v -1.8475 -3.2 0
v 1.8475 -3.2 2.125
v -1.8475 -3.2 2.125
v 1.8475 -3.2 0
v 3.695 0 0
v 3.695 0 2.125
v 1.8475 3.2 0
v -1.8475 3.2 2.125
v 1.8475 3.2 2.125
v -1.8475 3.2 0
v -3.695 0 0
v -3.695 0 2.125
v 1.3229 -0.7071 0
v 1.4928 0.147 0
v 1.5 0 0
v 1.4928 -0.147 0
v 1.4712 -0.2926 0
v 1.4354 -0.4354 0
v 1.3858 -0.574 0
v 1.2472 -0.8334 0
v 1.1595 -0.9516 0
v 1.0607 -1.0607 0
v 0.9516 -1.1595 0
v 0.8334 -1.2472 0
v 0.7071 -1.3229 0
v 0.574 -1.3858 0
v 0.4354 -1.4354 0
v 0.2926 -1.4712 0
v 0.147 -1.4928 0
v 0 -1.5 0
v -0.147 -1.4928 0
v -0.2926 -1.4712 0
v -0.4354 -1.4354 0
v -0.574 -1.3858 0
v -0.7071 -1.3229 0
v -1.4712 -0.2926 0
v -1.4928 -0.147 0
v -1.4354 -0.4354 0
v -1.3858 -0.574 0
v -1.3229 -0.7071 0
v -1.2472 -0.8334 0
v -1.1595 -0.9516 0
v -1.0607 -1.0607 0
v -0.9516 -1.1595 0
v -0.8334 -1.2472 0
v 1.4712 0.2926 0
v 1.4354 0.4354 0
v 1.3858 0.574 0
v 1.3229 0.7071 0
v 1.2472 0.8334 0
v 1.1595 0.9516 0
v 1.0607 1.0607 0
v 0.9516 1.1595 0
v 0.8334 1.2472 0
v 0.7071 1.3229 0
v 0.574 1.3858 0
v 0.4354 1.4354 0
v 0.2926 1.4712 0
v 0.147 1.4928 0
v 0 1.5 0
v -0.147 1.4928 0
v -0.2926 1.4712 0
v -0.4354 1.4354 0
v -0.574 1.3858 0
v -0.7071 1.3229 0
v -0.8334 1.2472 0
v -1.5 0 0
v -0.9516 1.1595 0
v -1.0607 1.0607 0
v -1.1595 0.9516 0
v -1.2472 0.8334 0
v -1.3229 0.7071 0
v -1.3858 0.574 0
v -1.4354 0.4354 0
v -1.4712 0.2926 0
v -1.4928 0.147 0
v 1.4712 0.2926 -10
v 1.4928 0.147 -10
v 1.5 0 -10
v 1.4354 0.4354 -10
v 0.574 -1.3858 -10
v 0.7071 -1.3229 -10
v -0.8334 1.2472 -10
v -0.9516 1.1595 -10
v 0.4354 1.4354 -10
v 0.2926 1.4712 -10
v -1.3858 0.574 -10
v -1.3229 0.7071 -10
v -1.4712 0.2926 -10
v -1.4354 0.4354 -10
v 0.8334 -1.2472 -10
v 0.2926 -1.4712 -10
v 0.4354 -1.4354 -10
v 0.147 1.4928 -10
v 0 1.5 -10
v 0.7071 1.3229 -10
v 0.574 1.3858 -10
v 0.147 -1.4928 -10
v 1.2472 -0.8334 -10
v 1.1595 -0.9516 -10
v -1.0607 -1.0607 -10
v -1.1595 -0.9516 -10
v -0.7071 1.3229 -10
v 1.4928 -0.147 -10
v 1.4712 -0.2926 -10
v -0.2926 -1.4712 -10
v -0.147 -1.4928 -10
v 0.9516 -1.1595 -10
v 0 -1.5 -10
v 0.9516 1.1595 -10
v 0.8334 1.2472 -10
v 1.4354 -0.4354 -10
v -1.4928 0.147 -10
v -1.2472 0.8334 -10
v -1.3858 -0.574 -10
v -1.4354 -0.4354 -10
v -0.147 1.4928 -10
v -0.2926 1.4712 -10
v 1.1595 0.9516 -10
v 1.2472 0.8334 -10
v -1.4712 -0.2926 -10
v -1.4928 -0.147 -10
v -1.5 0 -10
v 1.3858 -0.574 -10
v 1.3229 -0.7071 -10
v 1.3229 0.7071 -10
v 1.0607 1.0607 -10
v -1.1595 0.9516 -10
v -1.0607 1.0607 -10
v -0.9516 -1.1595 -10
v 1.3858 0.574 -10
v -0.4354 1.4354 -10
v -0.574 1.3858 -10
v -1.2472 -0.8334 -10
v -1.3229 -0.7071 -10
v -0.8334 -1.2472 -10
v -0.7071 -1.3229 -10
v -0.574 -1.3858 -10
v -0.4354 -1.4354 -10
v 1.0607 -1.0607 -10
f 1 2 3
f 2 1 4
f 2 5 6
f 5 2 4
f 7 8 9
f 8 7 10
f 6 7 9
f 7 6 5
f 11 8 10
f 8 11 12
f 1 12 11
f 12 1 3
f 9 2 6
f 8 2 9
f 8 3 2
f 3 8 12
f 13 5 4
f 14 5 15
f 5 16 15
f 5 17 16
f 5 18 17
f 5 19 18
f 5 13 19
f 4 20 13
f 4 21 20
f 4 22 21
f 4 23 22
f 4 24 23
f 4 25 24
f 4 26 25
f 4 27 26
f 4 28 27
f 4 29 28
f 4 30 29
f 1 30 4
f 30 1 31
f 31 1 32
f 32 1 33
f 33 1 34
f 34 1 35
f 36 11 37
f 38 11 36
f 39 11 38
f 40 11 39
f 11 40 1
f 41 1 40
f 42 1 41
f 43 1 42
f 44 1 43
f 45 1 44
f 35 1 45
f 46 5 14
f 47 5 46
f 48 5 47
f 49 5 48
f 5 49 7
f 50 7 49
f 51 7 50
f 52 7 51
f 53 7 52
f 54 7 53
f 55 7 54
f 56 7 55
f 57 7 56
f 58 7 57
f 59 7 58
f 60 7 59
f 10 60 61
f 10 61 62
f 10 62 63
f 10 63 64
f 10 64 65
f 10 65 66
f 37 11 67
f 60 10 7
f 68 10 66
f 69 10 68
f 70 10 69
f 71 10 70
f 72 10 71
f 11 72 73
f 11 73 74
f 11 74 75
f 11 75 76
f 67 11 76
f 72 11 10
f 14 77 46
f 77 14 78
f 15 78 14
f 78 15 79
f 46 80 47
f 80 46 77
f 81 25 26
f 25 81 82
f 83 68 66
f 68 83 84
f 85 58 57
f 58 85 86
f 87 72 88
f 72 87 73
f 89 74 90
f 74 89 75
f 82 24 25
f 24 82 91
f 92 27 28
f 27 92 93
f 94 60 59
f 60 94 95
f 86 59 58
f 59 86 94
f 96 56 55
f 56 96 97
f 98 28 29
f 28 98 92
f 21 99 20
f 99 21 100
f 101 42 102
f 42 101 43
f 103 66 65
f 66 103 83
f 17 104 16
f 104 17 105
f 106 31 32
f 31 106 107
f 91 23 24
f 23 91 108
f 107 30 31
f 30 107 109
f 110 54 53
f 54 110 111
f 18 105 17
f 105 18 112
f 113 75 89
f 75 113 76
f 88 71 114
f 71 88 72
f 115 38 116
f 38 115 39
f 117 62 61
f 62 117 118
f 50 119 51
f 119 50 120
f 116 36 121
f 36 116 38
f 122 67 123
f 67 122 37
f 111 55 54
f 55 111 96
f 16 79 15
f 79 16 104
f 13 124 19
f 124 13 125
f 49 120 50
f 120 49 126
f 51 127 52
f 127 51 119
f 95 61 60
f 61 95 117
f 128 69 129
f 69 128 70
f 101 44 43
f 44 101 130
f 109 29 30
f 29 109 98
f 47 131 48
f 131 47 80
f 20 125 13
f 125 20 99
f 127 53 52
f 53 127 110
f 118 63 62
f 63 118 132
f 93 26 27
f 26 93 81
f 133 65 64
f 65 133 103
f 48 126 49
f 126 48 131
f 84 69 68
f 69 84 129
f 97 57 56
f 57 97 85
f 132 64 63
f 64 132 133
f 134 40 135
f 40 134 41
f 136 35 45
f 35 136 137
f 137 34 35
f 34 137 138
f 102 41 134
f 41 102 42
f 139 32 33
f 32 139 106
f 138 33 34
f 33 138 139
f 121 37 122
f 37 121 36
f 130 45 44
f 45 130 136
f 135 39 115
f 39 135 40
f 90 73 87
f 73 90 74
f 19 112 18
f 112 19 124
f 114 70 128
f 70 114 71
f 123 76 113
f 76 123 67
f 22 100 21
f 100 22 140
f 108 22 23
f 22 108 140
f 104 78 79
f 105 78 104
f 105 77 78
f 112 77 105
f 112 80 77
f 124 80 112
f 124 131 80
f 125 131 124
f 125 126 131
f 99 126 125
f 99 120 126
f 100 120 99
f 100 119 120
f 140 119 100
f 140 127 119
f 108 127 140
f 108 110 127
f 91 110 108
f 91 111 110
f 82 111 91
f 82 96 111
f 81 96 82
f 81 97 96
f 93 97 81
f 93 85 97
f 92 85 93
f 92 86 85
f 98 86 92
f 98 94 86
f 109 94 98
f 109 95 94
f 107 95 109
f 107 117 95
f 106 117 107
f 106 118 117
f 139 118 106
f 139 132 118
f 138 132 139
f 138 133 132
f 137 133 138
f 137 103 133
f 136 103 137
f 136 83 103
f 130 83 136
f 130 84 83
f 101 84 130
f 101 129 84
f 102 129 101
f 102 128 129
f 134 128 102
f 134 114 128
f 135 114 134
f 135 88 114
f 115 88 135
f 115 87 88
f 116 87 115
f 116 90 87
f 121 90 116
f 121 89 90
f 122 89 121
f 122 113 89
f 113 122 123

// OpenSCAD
$fn=64;

module hex_prism(flat_d=6.4, h=2.125){
    r = flat_d / sqrt(3); // across flats = sqrt(3)*r
    cylinder(h=h, r=r, $fn=6);
}

module screw_shaft(d=3.0, L=10){
    translate([0,0,-L]) cylinder(h=L, d=d, $fn=64);
}

module hex_head_screw(shaft_d=3.0, head_flat_d=6.4, head_h=2.125, length=10){
    union(){
        hex_prism(flat_d=head_flat_d, h=head_h);
        screw_shaft(d=shaft_d, L=length);
    }
}

hex_head_screw();
